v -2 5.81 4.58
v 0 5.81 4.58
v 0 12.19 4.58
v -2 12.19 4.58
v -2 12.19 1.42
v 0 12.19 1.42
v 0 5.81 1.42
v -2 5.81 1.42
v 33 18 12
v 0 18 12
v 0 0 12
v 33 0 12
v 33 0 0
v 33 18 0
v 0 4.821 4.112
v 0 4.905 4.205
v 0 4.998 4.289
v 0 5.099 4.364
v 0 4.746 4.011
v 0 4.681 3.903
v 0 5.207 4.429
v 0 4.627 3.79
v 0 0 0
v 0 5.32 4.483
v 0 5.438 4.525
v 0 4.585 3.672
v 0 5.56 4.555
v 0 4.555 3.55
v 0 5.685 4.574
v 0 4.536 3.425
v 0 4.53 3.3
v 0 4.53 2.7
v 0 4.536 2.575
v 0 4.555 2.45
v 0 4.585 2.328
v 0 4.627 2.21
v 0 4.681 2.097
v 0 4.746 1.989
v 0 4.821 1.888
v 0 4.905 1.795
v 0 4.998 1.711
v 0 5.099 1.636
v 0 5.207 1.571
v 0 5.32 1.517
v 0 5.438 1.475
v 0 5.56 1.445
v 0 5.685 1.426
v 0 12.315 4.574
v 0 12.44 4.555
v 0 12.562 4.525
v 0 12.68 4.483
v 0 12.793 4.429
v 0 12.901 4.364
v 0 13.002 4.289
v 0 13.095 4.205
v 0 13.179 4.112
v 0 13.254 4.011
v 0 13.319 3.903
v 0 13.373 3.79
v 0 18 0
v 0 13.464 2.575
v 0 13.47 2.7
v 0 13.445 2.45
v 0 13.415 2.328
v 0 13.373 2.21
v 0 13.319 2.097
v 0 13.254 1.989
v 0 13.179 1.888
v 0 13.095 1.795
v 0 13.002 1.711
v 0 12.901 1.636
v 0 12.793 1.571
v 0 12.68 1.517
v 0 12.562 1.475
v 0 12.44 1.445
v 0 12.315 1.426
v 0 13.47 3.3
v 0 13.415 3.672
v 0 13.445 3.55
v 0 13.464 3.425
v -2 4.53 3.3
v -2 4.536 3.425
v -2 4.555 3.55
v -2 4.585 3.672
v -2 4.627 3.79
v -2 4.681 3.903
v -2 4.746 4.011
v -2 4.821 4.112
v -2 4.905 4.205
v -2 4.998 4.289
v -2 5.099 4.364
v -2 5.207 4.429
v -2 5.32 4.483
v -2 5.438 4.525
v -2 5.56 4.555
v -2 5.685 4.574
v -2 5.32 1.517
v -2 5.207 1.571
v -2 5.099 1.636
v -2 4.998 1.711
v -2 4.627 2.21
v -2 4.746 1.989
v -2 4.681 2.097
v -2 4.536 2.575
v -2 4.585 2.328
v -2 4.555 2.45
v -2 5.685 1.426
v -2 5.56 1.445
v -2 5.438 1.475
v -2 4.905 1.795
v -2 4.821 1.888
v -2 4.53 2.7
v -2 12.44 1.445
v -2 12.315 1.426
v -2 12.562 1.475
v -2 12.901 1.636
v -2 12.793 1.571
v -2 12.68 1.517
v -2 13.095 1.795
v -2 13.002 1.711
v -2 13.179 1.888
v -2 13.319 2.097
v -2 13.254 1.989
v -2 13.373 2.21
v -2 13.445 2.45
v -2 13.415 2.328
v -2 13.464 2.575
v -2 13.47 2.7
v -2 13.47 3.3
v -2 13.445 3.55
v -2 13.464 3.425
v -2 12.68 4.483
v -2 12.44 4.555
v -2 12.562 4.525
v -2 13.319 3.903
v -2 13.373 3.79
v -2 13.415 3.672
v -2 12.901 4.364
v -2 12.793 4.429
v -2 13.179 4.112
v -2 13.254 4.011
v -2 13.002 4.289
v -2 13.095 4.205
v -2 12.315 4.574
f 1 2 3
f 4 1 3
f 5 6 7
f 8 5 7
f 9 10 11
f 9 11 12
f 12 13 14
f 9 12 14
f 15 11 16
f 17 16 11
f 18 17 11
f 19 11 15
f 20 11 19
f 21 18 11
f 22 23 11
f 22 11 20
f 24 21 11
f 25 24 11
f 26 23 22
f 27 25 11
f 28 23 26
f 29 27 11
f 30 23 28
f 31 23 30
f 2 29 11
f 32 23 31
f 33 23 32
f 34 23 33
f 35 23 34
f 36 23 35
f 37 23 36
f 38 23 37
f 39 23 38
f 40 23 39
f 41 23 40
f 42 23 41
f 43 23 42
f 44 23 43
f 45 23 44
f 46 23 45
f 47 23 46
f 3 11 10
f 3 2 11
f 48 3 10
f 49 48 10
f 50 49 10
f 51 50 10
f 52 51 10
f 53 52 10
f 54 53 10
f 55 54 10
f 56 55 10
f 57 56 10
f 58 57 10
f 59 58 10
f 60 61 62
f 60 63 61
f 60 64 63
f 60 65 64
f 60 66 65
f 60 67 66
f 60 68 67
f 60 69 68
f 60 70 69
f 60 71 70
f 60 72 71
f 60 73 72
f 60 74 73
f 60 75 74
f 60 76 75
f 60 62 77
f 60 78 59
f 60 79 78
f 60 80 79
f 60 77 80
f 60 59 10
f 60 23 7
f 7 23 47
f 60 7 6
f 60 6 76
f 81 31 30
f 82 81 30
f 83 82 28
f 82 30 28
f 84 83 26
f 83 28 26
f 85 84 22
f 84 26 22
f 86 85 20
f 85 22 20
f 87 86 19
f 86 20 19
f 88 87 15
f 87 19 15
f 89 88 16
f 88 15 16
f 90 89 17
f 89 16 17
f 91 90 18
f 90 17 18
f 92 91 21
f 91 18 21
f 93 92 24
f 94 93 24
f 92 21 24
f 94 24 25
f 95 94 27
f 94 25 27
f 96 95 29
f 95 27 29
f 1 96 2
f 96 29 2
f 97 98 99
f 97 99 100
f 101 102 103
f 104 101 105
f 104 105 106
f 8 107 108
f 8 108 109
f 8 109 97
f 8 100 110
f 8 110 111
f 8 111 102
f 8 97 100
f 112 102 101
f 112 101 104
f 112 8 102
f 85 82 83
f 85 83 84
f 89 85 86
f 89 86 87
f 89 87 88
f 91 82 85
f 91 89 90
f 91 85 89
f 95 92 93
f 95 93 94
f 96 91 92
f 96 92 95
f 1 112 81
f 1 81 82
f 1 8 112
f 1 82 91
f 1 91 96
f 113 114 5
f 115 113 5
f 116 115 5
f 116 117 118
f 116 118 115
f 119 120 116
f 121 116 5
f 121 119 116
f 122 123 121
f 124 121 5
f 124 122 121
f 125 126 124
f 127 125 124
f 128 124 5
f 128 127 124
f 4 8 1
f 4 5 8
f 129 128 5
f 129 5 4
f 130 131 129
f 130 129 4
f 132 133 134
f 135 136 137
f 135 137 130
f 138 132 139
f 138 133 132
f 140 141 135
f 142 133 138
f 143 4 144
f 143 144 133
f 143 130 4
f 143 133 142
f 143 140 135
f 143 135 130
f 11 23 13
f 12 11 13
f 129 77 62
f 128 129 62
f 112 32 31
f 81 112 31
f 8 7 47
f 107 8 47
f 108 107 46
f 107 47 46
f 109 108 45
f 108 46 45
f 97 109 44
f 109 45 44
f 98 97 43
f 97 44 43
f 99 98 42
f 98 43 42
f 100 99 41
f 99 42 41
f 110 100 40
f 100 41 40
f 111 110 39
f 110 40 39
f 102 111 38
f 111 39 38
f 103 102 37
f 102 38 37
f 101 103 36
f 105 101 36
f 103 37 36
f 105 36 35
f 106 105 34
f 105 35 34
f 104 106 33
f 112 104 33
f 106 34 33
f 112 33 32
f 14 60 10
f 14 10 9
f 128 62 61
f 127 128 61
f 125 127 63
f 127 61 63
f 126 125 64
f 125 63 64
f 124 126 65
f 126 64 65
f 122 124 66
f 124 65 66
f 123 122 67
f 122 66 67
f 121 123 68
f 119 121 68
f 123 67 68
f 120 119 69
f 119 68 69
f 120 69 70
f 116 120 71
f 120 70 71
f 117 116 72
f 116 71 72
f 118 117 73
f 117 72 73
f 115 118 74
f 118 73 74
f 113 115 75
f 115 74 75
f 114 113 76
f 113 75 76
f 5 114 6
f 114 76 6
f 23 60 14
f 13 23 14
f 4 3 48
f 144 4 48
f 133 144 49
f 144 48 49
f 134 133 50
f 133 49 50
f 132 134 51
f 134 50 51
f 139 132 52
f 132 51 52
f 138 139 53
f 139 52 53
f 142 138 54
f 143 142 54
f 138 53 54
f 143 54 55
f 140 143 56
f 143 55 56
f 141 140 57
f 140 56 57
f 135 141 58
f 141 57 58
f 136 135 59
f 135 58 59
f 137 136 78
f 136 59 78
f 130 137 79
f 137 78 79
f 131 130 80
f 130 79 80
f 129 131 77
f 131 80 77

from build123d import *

# Parameters (mm, degrees)
SKETCH_1_W      = 33
SKETCH_1_H      = 18
EXTRUDE_1_DEPTH = 12
EXTRUDE_2_DEPTH = 2


with BuildPart() as part:
    # Эскиз1 → Бобышка-Вытянуть1 (new body)
    with BuildSketch(Plane.XY):
        with Locations((16.5, 9)):
            Rectangle(SKETCH_1_W, SKETCH_1_H)
    extrude(amount=EXTRUDE_1_DEPTH)

    # Эскиз2 → Бобышка-Вытянуть2 (add)
    with BuildSketch(Plane.ZY):
        with BuildLine():
            Line((2.7, 4.53), (3.3, 4.53))
            ThreePointArc((3.3, 4.53), (4.20509668, 4.90490332), (4.58, 5.81))
            Line((4.58, 5.81), (4.58, 12.19))
            ThreePointArc((4.58, 12.19), (4.20509668, 13.09509668), (3.3, 13.47))
            Line((3.3, 13.47), (2.7, 13.47))
            ThreePointArc((2.7, 13.47), (1.79490332, 13.09509668), (1.42, 12.19))
            Line((1.42, 12.19), (1.42, 5.81))
            ThreePointArc((1.42, 5.81), (1.79490332, 4.90490332), (2.7, 4.53))
        make_face()
    extrude(amount=EXTRUDE_2_DEPTH)


solid = part.part
